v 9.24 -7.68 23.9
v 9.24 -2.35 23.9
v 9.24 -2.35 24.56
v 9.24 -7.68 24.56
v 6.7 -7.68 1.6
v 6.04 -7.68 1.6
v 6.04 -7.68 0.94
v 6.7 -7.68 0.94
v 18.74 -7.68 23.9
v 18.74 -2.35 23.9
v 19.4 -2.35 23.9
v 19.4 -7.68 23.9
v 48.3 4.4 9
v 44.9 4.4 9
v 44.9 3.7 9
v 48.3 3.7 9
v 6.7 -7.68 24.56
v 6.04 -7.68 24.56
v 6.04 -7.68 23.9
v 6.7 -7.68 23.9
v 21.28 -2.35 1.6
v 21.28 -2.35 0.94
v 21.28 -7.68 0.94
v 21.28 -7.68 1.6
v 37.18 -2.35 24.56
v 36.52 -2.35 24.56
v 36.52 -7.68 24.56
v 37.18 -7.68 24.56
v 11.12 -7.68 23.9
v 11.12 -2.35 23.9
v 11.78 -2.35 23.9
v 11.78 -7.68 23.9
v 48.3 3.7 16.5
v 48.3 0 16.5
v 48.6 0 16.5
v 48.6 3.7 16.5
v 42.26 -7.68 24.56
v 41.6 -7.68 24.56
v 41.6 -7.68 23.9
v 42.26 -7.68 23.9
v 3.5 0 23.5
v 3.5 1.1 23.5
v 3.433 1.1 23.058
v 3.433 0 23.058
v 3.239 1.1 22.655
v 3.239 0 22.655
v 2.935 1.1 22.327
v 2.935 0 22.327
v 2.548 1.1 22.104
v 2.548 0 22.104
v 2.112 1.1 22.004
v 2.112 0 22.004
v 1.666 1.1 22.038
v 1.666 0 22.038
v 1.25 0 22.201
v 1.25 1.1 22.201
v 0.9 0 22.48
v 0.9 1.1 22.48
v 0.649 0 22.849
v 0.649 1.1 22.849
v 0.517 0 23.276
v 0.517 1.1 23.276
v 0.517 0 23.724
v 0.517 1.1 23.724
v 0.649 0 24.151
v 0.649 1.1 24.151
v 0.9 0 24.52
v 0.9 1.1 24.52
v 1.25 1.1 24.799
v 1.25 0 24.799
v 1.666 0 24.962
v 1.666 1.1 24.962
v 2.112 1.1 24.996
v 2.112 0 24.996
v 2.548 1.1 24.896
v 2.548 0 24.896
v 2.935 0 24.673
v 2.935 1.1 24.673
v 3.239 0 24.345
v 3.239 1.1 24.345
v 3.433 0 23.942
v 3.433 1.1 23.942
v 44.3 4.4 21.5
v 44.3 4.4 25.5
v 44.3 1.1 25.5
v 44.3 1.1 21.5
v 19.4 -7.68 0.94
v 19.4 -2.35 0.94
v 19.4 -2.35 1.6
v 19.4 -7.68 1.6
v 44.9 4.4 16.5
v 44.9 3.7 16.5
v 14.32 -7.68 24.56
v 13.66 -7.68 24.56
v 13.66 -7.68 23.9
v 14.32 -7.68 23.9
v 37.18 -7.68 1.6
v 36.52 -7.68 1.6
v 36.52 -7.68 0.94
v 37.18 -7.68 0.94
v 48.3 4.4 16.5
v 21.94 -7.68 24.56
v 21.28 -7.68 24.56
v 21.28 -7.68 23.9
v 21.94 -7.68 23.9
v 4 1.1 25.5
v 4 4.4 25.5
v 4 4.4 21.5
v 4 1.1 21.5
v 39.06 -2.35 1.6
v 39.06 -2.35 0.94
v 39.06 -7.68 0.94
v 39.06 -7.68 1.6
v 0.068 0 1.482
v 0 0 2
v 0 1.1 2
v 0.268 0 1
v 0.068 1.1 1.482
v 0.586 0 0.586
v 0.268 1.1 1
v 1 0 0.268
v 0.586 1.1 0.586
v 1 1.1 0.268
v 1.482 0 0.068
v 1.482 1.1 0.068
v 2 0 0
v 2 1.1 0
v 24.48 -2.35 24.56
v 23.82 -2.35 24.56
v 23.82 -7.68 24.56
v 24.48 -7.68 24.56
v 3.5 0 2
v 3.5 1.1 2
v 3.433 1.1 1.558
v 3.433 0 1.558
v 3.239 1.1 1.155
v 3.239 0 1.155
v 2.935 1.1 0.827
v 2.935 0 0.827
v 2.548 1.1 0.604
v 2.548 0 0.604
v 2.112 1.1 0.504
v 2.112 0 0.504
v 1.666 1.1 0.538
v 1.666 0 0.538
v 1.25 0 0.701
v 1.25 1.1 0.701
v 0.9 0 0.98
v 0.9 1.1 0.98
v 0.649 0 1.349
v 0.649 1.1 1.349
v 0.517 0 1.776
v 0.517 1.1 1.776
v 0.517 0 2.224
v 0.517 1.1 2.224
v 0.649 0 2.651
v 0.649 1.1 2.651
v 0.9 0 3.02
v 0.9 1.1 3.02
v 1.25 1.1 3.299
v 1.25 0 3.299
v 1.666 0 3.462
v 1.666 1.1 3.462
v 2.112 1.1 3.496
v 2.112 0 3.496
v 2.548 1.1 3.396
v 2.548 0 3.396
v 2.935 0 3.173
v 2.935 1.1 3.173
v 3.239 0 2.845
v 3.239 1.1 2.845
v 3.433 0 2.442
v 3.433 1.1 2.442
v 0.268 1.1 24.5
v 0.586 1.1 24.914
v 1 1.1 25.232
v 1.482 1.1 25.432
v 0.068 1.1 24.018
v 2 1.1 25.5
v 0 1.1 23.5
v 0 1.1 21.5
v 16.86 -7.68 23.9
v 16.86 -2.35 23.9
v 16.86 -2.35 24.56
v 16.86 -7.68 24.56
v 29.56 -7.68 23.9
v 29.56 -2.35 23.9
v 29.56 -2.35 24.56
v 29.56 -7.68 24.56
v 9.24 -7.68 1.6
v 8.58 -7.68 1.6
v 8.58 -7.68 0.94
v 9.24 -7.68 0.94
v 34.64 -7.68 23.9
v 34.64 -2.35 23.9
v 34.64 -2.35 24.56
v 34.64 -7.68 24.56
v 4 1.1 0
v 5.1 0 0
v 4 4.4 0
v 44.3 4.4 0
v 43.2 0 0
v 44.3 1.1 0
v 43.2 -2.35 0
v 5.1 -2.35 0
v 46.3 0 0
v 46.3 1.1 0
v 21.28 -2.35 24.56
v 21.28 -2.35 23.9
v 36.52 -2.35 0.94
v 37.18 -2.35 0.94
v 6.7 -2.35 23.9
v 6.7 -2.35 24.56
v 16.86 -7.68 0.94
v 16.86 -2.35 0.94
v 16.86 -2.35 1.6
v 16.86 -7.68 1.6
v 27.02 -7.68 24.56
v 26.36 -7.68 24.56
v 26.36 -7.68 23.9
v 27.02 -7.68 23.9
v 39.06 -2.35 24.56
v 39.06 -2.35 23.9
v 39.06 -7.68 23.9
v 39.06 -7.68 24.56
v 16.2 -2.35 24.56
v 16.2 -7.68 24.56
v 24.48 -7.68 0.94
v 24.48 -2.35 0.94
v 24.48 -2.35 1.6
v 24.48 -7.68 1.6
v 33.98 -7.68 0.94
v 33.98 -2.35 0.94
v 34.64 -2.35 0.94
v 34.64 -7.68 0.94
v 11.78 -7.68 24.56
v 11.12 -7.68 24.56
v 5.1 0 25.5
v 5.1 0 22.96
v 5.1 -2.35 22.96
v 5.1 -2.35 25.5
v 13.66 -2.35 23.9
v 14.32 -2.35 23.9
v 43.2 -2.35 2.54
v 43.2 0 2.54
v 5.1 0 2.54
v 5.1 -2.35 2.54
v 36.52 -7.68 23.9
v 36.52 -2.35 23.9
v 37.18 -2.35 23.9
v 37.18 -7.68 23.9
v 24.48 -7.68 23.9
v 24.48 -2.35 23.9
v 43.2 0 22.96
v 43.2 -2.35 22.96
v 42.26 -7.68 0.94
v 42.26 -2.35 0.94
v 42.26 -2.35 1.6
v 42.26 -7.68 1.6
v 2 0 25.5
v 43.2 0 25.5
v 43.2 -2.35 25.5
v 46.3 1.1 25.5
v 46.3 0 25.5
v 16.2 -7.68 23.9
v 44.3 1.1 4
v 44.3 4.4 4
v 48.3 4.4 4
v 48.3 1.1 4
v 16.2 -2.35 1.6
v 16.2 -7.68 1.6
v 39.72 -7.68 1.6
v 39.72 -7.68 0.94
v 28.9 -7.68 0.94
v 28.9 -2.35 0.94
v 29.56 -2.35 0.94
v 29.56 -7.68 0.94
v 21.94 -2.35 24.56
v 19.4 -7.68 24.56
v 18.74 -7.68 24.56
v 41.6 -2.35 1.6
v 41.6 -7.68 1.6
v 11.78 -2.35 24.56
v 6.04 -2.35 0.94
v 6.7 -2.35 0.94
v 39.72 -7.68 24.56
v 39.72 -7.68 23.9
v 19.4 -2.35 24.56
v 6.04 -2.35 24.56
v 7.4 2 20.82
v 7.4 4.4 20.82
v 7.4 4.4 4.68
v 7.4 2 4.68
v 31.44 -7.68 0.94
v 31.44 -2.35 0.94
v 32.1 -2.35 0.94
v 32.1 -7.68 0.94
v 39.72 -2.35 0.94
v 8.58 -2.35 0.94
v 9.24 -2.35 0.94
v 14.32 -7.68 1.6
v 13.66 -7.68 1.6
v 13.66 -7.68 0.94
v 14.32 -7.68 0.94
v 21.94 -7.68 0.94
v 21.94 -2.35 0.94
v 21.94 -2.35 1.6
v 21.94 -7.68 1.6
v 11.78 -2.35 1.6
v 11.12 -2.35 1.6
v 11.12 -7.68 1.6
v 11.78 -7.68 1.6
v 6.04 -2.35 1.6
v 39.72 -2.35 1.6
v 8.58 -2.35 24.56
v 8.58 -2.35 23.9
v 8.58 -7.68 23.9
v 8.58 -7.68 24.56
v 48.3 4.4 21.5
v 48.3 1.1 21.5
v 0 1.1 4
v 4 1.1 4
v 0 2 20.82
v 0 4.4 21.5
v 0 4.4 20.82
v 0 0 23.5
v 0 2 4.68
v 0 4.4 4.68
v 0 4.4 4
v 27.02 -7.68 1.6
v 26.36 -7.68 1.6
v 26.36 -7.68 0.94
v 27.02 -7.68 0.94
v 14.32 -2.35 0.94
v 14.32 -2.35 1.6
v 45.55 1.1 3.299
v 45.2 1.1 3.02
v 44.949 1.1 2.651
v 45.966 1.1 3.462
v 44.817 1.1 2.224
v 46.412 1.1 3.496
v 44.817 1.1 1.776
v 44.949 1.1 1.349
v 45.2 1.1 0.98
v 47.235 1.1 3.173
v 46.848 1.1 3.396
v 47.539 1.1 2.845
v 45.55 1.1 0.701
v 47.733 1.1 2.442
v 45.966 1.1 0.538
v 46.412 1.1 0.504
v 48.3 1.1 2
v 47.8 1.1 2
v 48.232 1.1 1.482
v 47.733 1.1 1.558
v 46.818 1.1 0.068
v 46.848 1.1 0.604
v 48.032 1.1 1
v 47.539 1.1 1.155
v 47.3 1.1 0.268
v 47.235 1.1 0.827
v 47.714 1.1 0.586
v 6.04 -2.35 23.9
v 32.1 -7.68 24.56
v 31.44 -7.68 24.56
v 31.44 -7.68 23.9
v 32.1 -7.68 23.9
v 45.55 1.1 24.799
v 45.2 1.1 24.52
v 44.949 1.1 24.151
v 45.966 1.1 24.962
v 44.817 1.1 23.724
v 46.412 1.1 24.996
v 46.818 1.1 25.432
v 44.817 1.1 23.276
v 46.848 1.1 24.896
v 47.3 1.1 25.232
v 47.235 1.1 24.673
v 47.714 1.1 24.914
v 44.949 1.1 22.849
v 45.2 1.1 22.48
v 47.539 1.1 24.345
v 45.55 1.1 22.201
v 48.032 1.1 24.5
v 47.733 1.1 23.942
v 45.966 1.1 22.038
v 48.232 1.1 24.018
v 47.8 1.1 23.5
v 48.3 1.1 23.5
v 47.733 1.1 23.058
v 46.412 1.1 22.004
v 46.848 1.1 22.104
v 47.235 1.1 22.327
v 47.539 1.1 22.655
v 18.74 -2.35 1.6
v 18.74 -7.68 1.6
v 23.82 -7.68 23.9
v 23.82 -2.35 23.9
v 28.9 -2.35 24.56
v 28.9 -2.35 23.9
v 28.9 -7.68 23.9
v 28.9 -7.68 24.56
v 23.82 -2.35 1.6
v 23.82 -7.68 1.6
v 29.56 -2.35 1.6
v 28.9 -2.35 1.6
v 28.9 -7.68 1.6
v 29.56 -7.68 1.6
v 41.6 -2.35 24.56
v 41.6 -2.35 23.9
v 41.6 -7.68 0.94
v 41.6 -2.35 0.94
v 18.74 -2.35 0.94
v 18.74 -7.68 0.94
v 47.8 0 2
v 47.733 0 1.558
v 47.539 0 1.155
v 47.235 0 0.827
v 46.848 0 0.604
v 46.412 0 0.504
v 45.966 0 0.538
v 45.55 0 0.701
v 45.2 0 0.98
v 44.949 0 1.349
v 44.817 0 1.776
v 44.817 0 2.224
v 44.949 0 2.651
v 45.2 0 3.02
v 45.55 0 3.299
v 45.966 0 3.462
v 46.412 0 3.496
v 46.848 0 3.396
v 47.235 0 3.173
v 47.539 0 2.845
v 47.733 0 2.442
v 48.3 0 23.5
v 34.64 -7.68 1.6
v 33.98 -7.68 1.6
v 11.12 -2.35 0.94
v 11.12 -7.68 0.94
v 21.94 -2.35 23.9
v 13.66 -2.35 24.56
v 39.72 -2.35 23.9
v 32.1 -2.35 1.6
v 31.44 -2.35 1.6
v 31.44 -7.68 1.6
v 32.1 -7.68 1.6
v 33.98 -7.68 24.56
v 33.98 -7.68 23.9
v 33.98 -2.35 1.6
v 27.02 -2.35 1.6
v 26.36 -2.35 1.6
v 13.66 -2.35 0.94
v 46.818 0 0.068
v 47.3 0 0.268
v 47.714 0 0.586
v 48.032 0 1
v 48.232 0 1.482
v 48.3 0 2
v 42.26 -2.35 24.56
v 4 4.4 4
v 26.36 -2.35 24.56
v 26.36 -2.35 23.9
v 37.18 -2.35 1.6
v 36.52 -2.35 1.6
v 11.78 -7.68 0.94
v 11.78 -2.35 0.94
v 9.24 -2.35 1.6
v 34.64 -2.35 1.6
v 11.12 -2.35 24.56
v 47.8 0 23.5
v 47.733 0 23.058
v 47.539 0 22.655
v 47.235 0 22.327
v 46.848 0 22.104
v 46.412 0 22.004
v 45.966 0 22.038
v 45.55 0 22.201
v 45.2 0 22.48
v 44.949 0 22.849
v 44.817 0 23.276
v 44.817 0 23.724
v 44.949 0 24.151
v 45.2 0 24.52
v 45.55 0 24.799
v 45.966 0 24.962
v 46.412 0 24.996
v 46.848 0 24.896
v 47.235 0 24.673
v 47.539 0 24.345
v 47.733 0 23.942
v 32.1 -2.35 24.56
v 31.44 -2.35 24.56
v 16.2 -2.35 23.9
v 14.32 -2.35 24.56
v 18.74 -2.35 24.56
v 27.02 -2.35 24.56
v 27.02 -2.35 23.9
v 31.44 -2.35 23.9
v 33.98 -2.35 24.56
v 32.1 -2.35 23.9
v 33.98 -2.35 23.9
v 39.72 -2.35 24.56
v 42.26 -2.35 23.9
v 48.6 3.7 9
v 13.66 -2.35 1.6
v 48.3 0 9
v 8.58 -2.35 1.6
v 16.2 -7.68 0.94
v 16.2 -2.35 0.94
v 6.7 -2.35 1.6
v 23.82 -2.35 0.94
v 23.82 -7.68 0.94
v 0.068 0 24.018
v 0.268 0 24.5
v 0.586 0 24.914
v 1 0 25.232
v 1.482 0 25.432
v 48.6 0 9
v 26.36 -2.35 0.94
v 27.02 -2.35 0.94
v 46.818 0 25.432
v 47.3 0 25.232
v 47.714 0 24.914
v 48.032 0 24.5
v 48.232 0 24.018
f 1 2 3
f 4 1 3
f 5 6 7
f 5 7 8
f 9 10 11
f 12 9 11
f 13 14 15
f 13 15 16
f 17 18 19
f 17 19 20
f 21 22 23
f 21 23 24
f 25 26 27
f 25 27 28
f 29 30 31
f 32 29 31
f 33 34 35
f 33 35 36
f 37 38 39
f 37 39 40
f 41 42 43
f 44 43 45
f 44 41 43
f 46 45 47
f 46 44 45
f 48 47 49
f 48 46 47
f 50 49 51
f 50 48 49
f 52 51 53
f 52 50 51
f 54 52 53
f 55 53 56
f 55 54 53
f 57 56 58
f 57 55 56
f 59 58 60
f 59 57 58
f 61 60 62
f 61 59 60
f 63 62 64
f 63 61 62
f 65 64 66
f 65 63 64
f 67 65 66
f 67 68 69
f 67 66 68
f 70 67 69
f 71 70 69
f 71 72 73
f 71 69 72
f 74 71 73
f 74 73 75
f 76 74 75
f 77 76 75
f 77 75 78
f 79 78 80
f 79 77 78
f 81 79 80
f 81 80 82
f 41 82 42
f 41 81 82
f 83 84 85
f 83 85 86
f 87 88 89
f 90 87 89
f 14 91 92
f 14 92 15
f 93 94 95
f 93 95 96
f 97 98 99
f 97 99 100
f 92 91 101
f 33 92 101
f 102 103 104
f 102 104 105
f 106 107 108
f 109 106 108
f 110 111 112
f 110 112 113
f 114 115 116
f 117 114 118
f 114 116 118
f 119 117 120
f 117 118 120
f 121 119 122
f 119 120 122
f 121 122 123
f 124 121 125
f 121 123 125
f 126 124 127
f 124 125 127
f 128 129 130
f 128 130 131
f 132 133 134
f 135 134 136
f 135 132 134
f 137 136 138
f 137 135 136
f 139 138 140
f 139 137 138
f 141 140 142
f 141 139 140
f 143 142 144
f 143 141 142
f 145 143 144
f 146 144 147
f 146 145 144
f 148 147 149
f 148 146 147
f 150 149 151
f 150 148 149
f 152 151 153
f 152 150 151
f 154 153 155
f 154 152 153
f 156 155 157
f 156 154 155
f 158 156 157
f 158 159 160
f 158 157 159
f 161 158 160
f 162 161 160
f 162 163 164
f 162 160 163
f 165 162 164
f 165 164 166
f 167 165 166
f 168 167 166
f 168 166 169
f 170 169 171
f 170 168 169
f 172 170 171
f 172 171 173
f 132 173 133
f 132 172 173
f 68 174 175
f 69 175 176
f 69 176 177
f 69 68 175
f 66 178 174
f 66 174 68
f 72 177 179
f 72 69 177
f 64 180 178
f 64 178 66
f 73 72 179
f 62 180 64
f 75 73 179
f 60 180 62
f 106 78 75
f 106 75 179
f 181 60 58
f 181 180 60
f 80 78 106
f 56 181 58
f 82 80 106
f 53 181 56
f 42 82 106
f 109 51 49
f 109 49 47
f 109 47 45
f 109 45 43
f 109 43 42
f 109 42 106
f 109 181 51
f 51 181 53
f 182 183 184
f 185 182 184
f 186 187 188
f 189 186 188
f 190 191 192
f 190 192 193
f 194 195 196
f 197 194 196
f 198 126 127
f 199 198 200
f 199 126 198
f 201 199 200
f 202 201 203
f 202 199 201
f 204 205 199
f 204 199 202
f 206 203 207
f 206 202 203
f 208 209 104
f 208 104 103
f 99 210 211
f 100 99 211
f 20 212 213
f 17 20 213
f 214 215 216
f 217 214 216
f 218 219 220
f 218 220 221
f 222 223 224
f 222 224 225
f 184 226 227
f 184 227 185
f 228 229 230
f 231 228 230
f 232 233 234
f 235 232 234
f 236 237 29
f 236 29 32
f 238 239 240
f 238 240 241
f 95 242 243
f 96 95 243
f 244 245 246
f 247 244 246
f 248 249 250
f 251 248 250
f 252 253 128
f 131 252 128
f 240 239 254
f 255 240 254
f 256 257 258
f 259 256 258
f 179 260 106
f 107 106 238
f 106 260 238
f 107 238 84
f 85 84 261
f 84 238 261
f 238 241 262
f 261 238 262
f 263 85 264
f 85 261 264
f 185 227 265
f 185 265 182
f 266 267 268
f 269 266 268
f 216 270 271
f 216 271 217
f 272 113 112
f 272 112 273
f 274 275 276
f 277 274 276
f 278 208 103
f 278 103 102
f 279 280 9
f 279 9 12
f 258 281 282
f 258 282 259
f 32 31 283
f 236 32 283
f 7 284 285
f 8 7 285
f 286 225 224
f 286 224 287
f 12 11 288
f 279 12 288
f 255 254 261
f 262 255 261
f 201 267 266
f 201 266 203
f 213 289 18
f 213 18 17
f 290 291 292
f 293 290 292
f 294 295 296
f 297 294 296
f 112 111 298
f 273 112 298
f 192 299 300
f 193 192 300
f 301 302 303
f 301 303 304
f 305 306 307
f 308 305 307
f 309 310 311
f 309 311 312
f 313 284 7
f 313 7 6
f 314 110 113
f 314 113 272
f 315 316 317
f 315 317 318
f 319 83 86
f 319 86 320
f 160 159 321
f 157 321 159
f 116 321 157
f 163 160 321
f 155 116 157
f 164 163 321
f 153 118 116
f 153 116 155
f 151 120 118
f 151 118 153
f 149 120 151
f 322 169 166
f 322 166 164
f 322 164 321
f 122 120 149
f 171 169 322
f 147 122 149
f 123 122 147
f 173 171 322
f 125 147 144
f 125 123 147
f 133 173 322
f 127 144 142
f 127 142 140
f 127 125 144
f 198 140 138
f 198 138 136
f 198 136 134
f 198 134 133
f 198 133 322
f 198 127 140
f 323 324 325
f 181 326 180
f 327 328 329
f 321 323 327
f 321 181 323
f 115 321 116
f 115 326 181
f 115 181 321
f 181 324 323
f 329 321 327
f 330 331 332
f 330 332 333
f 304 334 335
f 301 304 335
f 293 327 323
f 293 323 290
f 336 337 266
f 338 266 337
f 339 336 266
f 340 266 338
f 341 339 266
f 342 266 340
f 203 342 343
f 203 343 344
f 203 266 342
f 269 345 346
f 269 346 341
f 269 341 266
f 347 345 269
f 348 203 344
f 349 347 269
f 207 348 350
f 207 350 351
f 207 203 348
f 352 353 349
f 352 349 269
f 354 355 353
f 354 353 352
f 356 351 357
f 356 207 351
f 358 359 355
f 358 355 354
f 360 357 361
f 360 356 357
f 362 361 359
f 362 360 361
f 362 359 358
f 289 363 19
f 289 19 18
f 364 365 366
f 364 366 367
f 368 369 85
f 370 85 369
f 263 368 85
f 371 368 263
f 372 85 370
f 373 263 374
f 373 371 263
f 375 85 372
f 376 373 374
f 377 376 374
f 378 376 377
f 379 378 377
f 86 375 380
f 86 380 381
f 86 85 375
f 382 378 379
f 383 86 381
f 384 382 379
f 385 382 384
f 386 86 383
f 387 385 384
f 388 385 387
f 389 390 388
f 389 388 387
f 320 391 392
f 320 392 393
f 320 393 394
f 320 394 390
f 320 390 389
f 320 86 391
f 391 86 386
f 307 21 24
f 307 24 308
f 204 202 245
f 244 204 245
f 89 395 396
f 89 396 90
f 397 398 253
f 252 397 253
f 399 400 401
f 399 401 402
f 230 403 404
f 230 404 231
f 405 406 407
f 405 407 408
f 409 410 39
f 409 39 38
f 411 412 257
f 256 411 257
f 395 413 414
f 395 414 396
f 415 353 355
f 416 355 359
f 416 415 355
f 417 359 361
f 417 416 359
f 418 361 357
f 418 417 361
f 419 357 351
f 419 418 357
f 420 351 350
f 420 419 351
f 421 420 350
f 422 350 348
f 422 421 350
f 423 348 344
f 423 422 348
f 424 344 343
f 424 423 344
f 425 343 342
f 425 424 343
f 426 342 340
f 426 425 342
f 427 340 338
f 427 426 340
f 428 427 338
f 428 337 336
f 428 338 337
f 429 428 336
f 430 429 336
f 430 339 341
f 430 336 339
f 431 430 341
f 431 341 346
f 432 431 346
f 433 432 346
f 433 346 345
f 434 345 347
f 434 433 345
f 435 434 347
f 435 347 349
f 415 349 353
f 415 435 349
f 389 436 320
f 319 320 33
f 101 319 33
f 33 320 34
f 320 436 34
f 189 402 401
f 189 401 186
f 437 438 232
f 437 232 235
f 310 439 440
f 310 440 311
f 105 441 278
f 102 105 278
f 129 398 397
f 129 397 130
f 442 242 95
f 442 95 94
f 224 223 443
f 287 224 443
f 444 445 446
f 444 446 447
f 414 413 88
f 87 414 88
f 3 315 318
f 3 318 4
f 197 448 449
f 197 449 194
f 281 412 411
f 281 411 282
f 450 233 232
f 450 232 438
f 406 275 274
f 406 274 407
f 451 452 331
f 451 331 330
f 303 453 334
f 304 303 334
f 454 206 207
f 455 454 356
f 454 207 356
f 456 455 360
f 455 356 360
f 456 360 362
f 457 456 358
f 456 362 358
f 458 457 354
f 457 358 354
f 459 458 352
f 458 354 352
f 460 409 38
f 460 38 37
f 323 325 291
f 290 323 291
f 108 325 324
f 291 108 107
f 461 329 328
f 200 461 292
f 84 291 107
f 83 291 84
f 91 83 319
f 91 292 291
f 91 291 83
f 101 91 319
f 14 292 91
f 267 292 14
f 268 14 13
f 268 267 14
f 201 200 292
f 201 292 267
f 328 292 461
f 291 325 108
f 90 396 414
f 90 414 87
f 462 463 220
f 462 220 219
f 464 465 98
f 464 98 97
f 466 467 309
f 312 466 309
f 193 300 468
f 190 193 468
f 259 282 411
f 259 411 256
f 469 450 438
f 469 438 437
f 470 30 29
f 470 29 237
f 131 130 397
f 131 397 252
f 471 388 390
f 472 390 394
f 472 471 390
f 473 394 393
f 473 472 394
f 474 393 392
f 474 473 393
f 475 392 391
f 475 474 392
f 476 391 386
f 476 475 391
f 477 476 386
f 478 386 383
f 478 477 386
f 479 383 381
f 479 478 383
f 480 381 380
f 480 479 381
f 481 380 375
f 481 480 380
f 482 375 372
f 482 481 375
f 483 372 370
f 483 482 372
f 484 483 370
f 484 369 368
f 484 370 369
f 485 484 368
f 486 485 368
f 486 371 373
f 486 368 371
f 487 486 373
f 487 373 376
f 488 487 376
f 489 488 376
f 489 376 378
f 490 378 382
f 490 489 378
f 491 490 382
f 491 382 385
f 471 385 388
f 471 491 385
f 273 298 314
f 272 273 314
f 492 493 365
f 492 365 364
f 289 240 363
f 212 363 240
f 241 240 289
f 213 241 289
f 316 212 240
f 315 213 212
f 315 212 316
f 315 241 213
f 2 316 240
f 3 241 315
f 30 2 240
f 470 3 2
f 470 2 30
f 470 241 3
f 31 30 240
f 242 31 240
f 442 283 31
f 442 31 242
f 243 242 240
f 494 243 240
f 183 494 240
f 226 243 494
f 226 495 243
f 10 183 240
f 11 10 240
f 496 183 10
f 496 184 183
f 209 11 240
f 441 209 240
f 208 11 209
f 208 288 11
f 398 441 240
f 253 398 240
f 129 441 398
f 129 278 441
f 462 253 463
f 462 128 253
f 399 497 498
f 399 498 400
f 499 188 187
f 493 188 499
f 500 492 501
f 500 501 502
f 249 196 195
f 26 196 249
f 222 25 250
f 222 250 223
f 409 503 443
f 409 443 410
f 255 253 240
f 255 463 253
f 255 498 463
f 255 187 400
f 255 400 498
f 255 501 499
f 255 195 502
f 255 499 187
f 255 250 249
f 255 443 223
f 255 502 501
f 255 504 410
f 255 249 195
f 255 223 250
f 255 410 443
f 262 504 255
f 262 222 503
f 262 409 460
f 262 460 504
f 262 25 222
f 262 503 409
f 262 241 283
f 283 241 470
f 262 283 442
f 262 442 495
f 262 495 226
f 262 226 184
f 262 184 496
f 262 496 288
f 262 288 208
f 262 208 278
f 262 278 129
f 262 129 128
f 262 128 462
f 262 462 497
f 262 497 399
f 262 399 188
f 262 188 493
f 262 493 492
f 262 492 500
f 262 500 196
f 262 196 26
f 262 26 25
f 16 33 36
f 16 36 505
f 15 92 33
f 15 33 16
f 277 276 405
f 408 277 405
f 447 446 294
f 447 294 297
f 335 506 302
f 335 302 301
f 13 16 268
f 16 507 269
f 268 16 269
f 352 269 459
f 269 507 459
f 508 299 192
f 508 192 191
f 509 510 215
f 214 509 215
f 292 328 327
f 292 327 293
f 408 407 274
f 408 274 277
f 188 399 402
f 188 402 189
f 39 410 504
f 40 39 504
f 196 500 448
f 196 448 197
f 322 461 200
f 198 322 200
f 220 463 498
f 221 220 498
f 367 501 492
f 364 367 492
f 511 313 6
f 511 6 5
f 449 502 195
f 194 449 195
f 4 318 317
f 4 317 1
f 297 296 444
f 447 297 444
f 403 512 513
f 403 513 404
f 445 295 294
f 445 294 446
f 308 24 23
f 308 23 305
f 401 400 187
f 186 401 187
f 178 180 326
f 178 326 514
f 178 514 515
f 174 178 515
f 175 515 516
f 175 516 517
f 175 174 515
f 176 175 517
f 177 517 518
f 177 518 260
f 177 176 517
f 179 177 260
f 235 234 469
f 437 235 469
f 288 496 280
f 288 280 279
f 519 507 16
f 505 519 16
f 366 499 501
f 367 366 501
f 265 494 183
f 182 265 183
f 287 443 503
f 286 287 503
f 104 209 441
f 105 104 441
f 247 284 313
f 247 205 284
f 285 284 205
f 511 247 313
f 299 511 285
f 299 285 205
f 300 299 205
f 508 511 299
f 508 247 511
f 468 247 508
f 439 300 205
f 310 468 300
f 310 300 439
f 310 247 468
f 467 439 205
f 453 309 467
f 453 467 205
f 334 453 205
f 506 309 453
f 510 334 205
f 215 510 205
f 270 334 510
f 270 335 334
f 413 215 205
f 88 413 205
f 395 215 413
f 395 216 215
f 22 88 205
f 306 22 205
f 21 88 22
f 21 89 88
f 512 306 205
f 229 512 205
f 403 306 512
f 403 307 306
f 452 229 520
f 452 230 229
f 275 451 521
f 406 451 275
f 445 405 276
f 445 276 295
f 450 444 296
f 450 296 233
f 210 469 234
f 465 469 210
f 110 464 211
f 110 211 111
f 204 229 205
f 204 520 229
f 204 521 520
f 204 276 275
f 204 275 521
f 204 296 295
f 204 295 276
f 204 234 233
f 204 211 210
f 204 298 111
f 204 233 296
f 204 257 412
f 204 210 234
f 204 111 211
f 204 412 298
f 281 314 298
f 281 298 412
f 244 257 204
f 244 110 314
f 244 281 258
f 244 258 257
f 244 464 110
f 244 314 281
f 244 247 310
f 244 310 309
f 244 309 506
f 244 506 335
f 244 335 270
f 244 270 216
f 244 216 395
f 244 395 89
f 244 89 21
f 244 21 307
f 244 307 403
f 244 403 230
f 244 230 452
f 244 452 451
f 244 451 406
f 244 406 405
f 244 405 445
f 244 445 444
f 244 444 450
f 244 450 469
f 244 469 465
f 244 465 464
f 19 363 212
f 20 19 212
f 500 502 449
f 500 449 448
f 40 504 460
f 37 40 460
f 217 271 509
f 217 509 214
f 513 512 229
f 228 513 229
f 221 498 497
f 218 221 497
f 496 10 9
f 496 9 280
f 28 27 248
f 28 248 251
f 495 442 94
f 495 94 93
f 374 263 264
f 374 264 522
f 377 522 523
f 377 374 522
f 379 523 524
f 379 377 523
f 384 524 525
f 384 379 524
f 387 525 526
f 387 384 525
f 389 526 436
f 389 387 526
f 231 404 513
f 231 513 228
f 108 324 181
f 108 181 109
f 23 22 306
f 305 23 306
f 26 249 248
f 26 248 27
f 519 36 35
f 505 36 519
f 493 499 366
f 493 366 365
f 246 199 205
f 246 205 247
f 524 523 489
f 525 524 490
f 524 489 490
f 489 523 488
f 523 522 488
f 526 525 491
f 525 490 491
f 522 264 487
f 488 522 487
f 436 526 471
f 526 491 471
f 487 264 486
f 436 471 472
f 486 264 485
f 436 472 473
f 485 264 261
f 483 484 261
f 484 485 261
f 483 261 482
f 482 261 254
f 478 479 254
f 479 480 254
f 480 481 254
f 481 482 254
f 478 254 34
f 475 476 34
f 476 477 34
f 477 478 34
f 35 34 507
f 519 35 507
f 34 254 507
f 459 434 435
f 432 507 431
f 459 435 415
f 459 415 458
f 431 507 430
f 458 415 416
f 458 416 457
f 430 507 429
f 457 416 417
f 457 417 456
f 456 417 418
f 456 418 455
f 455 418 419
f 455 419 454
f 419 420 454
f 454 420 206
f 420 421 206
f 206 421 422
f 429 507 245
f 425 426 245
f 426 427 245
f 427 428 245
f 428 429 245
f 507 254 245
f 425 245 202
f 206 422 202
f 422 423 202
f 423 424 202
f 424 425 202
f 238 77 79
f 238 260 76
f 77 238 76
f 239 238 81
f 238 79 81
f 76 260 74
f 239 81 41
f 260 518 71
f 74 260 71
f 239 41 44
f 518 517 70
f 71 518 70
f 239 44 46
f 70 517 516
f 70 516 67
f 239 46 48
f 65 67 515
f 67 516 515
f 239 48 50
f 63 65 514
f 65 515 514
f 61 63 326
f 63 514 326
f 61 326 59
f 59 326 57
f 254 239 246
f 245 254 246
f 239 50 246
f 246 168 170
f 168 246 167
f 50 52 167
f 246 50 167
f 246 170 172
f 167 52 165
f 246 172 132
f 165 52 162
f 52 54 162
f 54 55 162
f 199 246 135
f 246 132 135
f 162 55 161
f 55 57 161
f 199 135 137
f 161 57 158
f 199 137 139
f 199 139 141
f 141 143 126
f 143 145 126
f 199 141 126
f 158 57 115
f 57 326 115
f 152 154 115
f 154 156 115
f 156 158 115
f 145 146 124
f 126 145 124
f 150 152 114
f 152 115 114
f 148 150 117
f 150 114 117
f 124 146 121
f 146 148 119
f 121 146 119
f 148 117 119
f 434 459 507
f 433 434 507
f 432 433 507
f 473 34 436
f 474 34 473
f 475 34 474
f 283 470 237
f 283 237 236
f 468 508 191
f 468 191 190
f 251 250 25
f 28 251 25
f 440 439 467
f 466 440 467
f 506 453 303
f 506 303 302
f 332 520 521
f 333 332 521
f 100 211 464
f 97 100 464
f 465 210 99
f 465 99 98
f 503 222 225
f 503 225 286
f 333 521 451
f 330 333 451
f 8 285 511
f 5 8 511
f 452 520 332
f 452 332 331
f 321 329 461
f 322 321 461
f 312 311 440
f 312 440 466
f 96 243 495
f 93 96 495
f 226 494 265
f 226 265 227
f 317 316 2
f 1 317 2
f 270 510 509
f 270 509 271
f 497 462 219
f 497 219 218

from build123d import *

# Parameters (mm, degrees)
SKETCH1_W           = 48.3
SKETCH1_H           = 25.5
SKETCH1_R           = 1.5
BOSS_EXTRUDE1_DEPTH = 4.4
FILLET1_R           = 2
SKETCH2_W           = 2.54
SKETCH2_H           = 2.54
BOSS_EXTRUDE2_DEPTH = 2.35
SKETCH3_W           = 0.66
SKETCH3_H           = 0.66
BOSS_EXTRUDE3_DEPTH = 5.33
SKETCH4_W           = 3.4
SKETCH4_H           = 7.5
CUT_EXTRUDE1_DEPTH  = 0.7
SKETCH5_W           = 7.5
SKETCH5_H           = 3.7
BOSS_EXTRUDE4_DEPTH = 0.3
SKETCH6_W           = 7.4
SKETCH6_H           = 16.14
CUT_EXTRUDE2_DEPTH  = 2.4
SKETCH7_W           = 4
SKETCH7_H           = 4
CUT_EXTRUDE3_DEPTH  = 3.3


with BuildPart() as part:
    # Sketch1 → Boss-Extrude1 (new body)
    with BuildSketch(Plane(origin=(0, 0, 0), x_dir=(1, 0, 0), z_dir=(0, 1, 0))):
        with Locations((24.15, -12.75)):
            Rectangle(SKETCH1_W, SKETCH1_H)
        with Locations((46.3, -2)):
            Circle(SKETCH1_R, mode=Mode.SUBTRACT)
        with Locations((2, -2)):
            Circle(SKETCH1_R, mode=Mode.SUBTRACT)
        with Locations((46.3, -23.5)):
            Circle(SKETCH1_R, mode=Mode.SUBTRACT)
        with Locations((2, -23.5)):
            Circle(SKETCH1_R, mode=Mode.SUBTRACT)
    extrude(amount=BOSS_EXTRUDE1_DEPTH)

    # Fillet1
    fillet1_edges = [part.edges().sort_by_distance(p)[0] for p in [
        (48.3, 2.2, 25.5),
        (0, 2.2, 25.5),
        (0, 2.2, 0),
        (48.3, 2.2, 0),
    ]]
    fillet(fillet1_edges, radius=FILLET1_R)

    # Sketch2 → Boss-Extrude2 (add)
    with BuildSketch(Plane.XZ):
        with Locations((6.37, 24.23)):
            Rectangle(SKETCH2_W, SKETCH2_H)
        with Locations((8.91, 24.23)):
            Rectangle(SKETCH2_W, SKETCH2_H)
        with Locations((11.45, 24.23)):
            Rectangle(SKETCH2_W, SKETCH2_H)
        with Locations((13.99, 24.23)):
            Rectangle(SKETCH2_W, SKETCH2_H)
        with Locations((16.53, 24.23)):
            Rectangle(SKETCH2_W, SKETCH2_H)
        with Locations((19.07, 24.23)):
            Rectangle(SKETCH2_W, SKETCH2_H)
        with Locations((21.61, 24.23)):
            Rectangle(SKETCH2_W, SKETCH2_H)
        with Locations((24.15, 24.23)):
            Rectangle(SKETCH2_W, SKETCH2_H)
        with Locations((26.69, 24.23)):
            Rectangle(SKETCH2_W, SKETCH2_H)
        with Locations((29.23, 24.23)):
            Rectangle(SKETCH2_W, SKETCH2_H)
        with Locations((31.77, 24.23)):
            Rectangle(SKETCH2_W, SKETCH2_H)
        with Locations((34.31, 24.23)):
            Rectangle(SKETCH2_W, SKETCH2_H)
        with Locations((36.85, 24.23)):
            Rectangle(SKETCH2_W, SKETCH2_H)
        with Locations((39.39, 24.23)):
            Rectangle(SKETCH2_W, SKETCH2_H)
        with Locations((41.93, 24.23)):
            Rectangle(SKETCH2_W, SKETCH2_H)
        with Locations((41.93, 1.27)):
            Rectangle(SKETCH2_W, SKETCH2_H)
        with Locations((39.39, 1.27)):
            Rectangle(SKETCH2_W, SKETCH2_H)
        with Locations((36.85, 1.27)):
            Rectangle(SKETCH2_W, SKETCH2_H)
        with Locations((34.31, 1.27)):
            Rectangle(SKETCH2_W, SKETCH2_H)
        with Locations((31.77, 1.27)):
            Rectangle(SKETCH2_W, SKETCH2_H)
        with Locations((29.23, 1.27)):
            Rectangle(SKETCH2_W, SKETCH2_H)
        with Locations((26.69, 1.27)):
            Rectangle(SKETCH2_W, SKETCH2_H)
        with Locations((24.15, 1.27)):
            Rectangle(SKETCH2_W, SKETCH2_H)
        with Locations((21.61, 1.27)):
            Rectangle(SKETCH2_W, SKETCH2_H)
        with Locations((19.07, 1.27)):
            Rectangle(SKETCH2_W, SKETCH2_H)
        with Locations((16.53, 1.27)):
            Rectangle(SKETCH2_W, SKETCH2_H)
        with Locations((13.99, 1.27)):
            Rectangle(SKETCH2_W, SKETCH2_H)
        with Locations((11.45, 1.27)):
            Rectangle(SKETCH2_W, SKETCH2_H)
        with Locations((8.91, 1.27)):
            Rectangle(SKETCH2_W, SKETCH2_H)
        with Locations((6.37, 1.27)):
            Rectangle(SKETCH2_W, SKETCH2_H)
    extrude(amount=BOSS_EXTRUDE2_DEPTH)

    # Sketch3 → Boss-Extrude3 (add)
    with BuildSketch(Plane.XZ.offset(2.35)):
        with Locations((6.37, 24.23)):
            Rectangle(SKETCH3_W, SKETCH3_H)
        with Locations((8.91, 24.23)):
            Rectangle(SKETCH3_W, SKETCH3_H)
        with Locations((11.45, 24.23)):
            Rectangle(SKETCH3_W, SKETCH3_H)
        with Locations((13.99, 24.23)):
            Rectangle(SKETCH3_W, SKETCH3_H)
        with Locations((16.53, 24.23)):
            Rectangle(SKETCH3_W, SKETCH3_H)
        with Locations((19.07, 24.23)):
            Rectangle(SKETCH3_W, SKETCH3_H)
        with Locations((21.61, 24.23)):
            Rectangle(SKETCH3_W, SKETCH3_H)
        with Locations((24.15, 24.23)):
            Rectangle(SKETCH3_W, SKETCH3_H)
        with Locations((26.69, 24.23)):
            Rectangle(SKETCH3_W, SKETCH3_H)
        with Locations((29.23, 24.23)):
            Rectangle(SKETCH3_W, SKETCH3_H)
        with Locations((31.77, 24.23)):
            Rectangle(SKETCH3_W, SKETCH3_H)
        with Locations((34.31, 24.23)):
            Rectangle(SKETCH3_W, SKETCH3_H)
        with Locations((36.85, 24.23)):
            Rectangle(SKETCH3_W, SKETCH3_H)
        with Locations((39.39, 24.23)):
            Rectangle(SKETCH3_W, SKETCH3_H)
        with Locations((41.93, 24.23)):
            Rectangle(SKETCH3_W, SKETCH3_H)
        with Locations((41.93, 1.27)):
            Rectangle(SKETCH3_W, SKETCH3_H)
        with Locations((39.39, 1.27)):
            Rectangle(SKETCH3_W, SKETCH3_H)
        with Locations((36.85, 1.27)):
            Rectangle(SKETCH3_W, SKETCH3_H)
        with Locations((34.31, 1.27)):
            Rectangle(SKETCH3_W, SKETCH3_H)
        with Locations((31.77, 1.27)):
            Rectangle(SKETCH3_W, SKETCH3_H)
        with Locations((29.23, 1.27)):
            Rectangle(SKETCH3_W, SKETCH3_H)
        with Locations((26.69, 1.27)):
            Rectangle(SKETCH3_W, SKETCH3_H)
        with Locations((24.15, 1.27)):
            Rectangle(SKETCH3_W, SKETCH3_H)
        with Locations((21.61, 1.27)):
            Rectangle(SKETCH3_W, SKETCH3_H)
        with Locations((19.07, 1.27)):
            Rectangle(SKETCH3_W, SKETCH3_H)
        with Locations((16.53, 1.27)):
            Rectangle(SKETCH3_W, SKETCH3_H)
        with Locations((13.99, 1.27)):
            Rectangle(SKETCH3_W, SKETCH3_H)
        with Locations((11.45, 1.27)):
            Rectangle(SKETCH3_W, SKETCH3_H)
        with Locations((8.91, 1.27)):
            Rectangle(SKETCH3_W, SKETCH3_H)
        with Locations((6.37, 1.27)):
            Rectangle(SKETCH3_W, SKETCH3_H)
    extrude(amount=BOSS_EXTRUDE3_DEPTH)

    # Sketch4 → Cut-Extrude1 (cut)
    with BuildSketch(Plane(origin=(0, 4.4, 0), x_dir=(1, 0, 0), z_dir=(0, 1, 0))):
        with Locations((46.6, -12.75)):
            Rectangle(SKETCH4_W, SKETCH4_H)
    extrude(amount=-CUT_EXTRUDE1_DEPTH, mode=Mode.SUBTRACT)

    # Sketch5 → Boss-Extrude4 (add)
    with BuildSketch(Plane(origin=(48.3, 0, 0), x_dir=(0, 0, -1), z_dir=(1, 0, 0))):
        with Locations((-12.75, 1.85)):
            Rectangle(SKETCH5_W, SKETCH5_H)
    extrude(amount=BOSS_EXTRUDE4_DEPTH)

    # Sketch6 → Cut-Extrude2 (cut)
    with BuildSketch(Plane(origin=(0, 4.4, 0), x_dir=(1, 0, 0), z_dir=(0, 1, 0))):
        with Locations((3.7, -12.75)):
            Rectangle(SKETCH6_W, SKETCH6_H)
    extrude(amount=-CUT_EXTRUDE2_DEPTH, mode=Mode.SUBTRACT)

    # Sketch7 → Cut-Extrude3 (cut)
    with BuildSketch(Plane(origin=(0, 4.4, 0), x_dir=(1, 0, 0), z_dir=(0, 1, 0))):
        with Locations((2, -2)):
            Rectangle(SKETCH7_W, SKETCH7_H)
        with Locations((46.3, -2)):
            Rectangle(SKETCH7_W, SKETCH7_H)
        with Locations((46.3, -23.5)):
            Rectangle(SKETCH7_W, SKETCH7_H)
        with Locations((2, -23.5)):
            Rectangle(SKETCH7_W, SKETCH7_H)
    extrude(amount=-CUT_EXTRUDE3_DEPTH, mode=Mode.SUBTRACT)


solid = part.part
